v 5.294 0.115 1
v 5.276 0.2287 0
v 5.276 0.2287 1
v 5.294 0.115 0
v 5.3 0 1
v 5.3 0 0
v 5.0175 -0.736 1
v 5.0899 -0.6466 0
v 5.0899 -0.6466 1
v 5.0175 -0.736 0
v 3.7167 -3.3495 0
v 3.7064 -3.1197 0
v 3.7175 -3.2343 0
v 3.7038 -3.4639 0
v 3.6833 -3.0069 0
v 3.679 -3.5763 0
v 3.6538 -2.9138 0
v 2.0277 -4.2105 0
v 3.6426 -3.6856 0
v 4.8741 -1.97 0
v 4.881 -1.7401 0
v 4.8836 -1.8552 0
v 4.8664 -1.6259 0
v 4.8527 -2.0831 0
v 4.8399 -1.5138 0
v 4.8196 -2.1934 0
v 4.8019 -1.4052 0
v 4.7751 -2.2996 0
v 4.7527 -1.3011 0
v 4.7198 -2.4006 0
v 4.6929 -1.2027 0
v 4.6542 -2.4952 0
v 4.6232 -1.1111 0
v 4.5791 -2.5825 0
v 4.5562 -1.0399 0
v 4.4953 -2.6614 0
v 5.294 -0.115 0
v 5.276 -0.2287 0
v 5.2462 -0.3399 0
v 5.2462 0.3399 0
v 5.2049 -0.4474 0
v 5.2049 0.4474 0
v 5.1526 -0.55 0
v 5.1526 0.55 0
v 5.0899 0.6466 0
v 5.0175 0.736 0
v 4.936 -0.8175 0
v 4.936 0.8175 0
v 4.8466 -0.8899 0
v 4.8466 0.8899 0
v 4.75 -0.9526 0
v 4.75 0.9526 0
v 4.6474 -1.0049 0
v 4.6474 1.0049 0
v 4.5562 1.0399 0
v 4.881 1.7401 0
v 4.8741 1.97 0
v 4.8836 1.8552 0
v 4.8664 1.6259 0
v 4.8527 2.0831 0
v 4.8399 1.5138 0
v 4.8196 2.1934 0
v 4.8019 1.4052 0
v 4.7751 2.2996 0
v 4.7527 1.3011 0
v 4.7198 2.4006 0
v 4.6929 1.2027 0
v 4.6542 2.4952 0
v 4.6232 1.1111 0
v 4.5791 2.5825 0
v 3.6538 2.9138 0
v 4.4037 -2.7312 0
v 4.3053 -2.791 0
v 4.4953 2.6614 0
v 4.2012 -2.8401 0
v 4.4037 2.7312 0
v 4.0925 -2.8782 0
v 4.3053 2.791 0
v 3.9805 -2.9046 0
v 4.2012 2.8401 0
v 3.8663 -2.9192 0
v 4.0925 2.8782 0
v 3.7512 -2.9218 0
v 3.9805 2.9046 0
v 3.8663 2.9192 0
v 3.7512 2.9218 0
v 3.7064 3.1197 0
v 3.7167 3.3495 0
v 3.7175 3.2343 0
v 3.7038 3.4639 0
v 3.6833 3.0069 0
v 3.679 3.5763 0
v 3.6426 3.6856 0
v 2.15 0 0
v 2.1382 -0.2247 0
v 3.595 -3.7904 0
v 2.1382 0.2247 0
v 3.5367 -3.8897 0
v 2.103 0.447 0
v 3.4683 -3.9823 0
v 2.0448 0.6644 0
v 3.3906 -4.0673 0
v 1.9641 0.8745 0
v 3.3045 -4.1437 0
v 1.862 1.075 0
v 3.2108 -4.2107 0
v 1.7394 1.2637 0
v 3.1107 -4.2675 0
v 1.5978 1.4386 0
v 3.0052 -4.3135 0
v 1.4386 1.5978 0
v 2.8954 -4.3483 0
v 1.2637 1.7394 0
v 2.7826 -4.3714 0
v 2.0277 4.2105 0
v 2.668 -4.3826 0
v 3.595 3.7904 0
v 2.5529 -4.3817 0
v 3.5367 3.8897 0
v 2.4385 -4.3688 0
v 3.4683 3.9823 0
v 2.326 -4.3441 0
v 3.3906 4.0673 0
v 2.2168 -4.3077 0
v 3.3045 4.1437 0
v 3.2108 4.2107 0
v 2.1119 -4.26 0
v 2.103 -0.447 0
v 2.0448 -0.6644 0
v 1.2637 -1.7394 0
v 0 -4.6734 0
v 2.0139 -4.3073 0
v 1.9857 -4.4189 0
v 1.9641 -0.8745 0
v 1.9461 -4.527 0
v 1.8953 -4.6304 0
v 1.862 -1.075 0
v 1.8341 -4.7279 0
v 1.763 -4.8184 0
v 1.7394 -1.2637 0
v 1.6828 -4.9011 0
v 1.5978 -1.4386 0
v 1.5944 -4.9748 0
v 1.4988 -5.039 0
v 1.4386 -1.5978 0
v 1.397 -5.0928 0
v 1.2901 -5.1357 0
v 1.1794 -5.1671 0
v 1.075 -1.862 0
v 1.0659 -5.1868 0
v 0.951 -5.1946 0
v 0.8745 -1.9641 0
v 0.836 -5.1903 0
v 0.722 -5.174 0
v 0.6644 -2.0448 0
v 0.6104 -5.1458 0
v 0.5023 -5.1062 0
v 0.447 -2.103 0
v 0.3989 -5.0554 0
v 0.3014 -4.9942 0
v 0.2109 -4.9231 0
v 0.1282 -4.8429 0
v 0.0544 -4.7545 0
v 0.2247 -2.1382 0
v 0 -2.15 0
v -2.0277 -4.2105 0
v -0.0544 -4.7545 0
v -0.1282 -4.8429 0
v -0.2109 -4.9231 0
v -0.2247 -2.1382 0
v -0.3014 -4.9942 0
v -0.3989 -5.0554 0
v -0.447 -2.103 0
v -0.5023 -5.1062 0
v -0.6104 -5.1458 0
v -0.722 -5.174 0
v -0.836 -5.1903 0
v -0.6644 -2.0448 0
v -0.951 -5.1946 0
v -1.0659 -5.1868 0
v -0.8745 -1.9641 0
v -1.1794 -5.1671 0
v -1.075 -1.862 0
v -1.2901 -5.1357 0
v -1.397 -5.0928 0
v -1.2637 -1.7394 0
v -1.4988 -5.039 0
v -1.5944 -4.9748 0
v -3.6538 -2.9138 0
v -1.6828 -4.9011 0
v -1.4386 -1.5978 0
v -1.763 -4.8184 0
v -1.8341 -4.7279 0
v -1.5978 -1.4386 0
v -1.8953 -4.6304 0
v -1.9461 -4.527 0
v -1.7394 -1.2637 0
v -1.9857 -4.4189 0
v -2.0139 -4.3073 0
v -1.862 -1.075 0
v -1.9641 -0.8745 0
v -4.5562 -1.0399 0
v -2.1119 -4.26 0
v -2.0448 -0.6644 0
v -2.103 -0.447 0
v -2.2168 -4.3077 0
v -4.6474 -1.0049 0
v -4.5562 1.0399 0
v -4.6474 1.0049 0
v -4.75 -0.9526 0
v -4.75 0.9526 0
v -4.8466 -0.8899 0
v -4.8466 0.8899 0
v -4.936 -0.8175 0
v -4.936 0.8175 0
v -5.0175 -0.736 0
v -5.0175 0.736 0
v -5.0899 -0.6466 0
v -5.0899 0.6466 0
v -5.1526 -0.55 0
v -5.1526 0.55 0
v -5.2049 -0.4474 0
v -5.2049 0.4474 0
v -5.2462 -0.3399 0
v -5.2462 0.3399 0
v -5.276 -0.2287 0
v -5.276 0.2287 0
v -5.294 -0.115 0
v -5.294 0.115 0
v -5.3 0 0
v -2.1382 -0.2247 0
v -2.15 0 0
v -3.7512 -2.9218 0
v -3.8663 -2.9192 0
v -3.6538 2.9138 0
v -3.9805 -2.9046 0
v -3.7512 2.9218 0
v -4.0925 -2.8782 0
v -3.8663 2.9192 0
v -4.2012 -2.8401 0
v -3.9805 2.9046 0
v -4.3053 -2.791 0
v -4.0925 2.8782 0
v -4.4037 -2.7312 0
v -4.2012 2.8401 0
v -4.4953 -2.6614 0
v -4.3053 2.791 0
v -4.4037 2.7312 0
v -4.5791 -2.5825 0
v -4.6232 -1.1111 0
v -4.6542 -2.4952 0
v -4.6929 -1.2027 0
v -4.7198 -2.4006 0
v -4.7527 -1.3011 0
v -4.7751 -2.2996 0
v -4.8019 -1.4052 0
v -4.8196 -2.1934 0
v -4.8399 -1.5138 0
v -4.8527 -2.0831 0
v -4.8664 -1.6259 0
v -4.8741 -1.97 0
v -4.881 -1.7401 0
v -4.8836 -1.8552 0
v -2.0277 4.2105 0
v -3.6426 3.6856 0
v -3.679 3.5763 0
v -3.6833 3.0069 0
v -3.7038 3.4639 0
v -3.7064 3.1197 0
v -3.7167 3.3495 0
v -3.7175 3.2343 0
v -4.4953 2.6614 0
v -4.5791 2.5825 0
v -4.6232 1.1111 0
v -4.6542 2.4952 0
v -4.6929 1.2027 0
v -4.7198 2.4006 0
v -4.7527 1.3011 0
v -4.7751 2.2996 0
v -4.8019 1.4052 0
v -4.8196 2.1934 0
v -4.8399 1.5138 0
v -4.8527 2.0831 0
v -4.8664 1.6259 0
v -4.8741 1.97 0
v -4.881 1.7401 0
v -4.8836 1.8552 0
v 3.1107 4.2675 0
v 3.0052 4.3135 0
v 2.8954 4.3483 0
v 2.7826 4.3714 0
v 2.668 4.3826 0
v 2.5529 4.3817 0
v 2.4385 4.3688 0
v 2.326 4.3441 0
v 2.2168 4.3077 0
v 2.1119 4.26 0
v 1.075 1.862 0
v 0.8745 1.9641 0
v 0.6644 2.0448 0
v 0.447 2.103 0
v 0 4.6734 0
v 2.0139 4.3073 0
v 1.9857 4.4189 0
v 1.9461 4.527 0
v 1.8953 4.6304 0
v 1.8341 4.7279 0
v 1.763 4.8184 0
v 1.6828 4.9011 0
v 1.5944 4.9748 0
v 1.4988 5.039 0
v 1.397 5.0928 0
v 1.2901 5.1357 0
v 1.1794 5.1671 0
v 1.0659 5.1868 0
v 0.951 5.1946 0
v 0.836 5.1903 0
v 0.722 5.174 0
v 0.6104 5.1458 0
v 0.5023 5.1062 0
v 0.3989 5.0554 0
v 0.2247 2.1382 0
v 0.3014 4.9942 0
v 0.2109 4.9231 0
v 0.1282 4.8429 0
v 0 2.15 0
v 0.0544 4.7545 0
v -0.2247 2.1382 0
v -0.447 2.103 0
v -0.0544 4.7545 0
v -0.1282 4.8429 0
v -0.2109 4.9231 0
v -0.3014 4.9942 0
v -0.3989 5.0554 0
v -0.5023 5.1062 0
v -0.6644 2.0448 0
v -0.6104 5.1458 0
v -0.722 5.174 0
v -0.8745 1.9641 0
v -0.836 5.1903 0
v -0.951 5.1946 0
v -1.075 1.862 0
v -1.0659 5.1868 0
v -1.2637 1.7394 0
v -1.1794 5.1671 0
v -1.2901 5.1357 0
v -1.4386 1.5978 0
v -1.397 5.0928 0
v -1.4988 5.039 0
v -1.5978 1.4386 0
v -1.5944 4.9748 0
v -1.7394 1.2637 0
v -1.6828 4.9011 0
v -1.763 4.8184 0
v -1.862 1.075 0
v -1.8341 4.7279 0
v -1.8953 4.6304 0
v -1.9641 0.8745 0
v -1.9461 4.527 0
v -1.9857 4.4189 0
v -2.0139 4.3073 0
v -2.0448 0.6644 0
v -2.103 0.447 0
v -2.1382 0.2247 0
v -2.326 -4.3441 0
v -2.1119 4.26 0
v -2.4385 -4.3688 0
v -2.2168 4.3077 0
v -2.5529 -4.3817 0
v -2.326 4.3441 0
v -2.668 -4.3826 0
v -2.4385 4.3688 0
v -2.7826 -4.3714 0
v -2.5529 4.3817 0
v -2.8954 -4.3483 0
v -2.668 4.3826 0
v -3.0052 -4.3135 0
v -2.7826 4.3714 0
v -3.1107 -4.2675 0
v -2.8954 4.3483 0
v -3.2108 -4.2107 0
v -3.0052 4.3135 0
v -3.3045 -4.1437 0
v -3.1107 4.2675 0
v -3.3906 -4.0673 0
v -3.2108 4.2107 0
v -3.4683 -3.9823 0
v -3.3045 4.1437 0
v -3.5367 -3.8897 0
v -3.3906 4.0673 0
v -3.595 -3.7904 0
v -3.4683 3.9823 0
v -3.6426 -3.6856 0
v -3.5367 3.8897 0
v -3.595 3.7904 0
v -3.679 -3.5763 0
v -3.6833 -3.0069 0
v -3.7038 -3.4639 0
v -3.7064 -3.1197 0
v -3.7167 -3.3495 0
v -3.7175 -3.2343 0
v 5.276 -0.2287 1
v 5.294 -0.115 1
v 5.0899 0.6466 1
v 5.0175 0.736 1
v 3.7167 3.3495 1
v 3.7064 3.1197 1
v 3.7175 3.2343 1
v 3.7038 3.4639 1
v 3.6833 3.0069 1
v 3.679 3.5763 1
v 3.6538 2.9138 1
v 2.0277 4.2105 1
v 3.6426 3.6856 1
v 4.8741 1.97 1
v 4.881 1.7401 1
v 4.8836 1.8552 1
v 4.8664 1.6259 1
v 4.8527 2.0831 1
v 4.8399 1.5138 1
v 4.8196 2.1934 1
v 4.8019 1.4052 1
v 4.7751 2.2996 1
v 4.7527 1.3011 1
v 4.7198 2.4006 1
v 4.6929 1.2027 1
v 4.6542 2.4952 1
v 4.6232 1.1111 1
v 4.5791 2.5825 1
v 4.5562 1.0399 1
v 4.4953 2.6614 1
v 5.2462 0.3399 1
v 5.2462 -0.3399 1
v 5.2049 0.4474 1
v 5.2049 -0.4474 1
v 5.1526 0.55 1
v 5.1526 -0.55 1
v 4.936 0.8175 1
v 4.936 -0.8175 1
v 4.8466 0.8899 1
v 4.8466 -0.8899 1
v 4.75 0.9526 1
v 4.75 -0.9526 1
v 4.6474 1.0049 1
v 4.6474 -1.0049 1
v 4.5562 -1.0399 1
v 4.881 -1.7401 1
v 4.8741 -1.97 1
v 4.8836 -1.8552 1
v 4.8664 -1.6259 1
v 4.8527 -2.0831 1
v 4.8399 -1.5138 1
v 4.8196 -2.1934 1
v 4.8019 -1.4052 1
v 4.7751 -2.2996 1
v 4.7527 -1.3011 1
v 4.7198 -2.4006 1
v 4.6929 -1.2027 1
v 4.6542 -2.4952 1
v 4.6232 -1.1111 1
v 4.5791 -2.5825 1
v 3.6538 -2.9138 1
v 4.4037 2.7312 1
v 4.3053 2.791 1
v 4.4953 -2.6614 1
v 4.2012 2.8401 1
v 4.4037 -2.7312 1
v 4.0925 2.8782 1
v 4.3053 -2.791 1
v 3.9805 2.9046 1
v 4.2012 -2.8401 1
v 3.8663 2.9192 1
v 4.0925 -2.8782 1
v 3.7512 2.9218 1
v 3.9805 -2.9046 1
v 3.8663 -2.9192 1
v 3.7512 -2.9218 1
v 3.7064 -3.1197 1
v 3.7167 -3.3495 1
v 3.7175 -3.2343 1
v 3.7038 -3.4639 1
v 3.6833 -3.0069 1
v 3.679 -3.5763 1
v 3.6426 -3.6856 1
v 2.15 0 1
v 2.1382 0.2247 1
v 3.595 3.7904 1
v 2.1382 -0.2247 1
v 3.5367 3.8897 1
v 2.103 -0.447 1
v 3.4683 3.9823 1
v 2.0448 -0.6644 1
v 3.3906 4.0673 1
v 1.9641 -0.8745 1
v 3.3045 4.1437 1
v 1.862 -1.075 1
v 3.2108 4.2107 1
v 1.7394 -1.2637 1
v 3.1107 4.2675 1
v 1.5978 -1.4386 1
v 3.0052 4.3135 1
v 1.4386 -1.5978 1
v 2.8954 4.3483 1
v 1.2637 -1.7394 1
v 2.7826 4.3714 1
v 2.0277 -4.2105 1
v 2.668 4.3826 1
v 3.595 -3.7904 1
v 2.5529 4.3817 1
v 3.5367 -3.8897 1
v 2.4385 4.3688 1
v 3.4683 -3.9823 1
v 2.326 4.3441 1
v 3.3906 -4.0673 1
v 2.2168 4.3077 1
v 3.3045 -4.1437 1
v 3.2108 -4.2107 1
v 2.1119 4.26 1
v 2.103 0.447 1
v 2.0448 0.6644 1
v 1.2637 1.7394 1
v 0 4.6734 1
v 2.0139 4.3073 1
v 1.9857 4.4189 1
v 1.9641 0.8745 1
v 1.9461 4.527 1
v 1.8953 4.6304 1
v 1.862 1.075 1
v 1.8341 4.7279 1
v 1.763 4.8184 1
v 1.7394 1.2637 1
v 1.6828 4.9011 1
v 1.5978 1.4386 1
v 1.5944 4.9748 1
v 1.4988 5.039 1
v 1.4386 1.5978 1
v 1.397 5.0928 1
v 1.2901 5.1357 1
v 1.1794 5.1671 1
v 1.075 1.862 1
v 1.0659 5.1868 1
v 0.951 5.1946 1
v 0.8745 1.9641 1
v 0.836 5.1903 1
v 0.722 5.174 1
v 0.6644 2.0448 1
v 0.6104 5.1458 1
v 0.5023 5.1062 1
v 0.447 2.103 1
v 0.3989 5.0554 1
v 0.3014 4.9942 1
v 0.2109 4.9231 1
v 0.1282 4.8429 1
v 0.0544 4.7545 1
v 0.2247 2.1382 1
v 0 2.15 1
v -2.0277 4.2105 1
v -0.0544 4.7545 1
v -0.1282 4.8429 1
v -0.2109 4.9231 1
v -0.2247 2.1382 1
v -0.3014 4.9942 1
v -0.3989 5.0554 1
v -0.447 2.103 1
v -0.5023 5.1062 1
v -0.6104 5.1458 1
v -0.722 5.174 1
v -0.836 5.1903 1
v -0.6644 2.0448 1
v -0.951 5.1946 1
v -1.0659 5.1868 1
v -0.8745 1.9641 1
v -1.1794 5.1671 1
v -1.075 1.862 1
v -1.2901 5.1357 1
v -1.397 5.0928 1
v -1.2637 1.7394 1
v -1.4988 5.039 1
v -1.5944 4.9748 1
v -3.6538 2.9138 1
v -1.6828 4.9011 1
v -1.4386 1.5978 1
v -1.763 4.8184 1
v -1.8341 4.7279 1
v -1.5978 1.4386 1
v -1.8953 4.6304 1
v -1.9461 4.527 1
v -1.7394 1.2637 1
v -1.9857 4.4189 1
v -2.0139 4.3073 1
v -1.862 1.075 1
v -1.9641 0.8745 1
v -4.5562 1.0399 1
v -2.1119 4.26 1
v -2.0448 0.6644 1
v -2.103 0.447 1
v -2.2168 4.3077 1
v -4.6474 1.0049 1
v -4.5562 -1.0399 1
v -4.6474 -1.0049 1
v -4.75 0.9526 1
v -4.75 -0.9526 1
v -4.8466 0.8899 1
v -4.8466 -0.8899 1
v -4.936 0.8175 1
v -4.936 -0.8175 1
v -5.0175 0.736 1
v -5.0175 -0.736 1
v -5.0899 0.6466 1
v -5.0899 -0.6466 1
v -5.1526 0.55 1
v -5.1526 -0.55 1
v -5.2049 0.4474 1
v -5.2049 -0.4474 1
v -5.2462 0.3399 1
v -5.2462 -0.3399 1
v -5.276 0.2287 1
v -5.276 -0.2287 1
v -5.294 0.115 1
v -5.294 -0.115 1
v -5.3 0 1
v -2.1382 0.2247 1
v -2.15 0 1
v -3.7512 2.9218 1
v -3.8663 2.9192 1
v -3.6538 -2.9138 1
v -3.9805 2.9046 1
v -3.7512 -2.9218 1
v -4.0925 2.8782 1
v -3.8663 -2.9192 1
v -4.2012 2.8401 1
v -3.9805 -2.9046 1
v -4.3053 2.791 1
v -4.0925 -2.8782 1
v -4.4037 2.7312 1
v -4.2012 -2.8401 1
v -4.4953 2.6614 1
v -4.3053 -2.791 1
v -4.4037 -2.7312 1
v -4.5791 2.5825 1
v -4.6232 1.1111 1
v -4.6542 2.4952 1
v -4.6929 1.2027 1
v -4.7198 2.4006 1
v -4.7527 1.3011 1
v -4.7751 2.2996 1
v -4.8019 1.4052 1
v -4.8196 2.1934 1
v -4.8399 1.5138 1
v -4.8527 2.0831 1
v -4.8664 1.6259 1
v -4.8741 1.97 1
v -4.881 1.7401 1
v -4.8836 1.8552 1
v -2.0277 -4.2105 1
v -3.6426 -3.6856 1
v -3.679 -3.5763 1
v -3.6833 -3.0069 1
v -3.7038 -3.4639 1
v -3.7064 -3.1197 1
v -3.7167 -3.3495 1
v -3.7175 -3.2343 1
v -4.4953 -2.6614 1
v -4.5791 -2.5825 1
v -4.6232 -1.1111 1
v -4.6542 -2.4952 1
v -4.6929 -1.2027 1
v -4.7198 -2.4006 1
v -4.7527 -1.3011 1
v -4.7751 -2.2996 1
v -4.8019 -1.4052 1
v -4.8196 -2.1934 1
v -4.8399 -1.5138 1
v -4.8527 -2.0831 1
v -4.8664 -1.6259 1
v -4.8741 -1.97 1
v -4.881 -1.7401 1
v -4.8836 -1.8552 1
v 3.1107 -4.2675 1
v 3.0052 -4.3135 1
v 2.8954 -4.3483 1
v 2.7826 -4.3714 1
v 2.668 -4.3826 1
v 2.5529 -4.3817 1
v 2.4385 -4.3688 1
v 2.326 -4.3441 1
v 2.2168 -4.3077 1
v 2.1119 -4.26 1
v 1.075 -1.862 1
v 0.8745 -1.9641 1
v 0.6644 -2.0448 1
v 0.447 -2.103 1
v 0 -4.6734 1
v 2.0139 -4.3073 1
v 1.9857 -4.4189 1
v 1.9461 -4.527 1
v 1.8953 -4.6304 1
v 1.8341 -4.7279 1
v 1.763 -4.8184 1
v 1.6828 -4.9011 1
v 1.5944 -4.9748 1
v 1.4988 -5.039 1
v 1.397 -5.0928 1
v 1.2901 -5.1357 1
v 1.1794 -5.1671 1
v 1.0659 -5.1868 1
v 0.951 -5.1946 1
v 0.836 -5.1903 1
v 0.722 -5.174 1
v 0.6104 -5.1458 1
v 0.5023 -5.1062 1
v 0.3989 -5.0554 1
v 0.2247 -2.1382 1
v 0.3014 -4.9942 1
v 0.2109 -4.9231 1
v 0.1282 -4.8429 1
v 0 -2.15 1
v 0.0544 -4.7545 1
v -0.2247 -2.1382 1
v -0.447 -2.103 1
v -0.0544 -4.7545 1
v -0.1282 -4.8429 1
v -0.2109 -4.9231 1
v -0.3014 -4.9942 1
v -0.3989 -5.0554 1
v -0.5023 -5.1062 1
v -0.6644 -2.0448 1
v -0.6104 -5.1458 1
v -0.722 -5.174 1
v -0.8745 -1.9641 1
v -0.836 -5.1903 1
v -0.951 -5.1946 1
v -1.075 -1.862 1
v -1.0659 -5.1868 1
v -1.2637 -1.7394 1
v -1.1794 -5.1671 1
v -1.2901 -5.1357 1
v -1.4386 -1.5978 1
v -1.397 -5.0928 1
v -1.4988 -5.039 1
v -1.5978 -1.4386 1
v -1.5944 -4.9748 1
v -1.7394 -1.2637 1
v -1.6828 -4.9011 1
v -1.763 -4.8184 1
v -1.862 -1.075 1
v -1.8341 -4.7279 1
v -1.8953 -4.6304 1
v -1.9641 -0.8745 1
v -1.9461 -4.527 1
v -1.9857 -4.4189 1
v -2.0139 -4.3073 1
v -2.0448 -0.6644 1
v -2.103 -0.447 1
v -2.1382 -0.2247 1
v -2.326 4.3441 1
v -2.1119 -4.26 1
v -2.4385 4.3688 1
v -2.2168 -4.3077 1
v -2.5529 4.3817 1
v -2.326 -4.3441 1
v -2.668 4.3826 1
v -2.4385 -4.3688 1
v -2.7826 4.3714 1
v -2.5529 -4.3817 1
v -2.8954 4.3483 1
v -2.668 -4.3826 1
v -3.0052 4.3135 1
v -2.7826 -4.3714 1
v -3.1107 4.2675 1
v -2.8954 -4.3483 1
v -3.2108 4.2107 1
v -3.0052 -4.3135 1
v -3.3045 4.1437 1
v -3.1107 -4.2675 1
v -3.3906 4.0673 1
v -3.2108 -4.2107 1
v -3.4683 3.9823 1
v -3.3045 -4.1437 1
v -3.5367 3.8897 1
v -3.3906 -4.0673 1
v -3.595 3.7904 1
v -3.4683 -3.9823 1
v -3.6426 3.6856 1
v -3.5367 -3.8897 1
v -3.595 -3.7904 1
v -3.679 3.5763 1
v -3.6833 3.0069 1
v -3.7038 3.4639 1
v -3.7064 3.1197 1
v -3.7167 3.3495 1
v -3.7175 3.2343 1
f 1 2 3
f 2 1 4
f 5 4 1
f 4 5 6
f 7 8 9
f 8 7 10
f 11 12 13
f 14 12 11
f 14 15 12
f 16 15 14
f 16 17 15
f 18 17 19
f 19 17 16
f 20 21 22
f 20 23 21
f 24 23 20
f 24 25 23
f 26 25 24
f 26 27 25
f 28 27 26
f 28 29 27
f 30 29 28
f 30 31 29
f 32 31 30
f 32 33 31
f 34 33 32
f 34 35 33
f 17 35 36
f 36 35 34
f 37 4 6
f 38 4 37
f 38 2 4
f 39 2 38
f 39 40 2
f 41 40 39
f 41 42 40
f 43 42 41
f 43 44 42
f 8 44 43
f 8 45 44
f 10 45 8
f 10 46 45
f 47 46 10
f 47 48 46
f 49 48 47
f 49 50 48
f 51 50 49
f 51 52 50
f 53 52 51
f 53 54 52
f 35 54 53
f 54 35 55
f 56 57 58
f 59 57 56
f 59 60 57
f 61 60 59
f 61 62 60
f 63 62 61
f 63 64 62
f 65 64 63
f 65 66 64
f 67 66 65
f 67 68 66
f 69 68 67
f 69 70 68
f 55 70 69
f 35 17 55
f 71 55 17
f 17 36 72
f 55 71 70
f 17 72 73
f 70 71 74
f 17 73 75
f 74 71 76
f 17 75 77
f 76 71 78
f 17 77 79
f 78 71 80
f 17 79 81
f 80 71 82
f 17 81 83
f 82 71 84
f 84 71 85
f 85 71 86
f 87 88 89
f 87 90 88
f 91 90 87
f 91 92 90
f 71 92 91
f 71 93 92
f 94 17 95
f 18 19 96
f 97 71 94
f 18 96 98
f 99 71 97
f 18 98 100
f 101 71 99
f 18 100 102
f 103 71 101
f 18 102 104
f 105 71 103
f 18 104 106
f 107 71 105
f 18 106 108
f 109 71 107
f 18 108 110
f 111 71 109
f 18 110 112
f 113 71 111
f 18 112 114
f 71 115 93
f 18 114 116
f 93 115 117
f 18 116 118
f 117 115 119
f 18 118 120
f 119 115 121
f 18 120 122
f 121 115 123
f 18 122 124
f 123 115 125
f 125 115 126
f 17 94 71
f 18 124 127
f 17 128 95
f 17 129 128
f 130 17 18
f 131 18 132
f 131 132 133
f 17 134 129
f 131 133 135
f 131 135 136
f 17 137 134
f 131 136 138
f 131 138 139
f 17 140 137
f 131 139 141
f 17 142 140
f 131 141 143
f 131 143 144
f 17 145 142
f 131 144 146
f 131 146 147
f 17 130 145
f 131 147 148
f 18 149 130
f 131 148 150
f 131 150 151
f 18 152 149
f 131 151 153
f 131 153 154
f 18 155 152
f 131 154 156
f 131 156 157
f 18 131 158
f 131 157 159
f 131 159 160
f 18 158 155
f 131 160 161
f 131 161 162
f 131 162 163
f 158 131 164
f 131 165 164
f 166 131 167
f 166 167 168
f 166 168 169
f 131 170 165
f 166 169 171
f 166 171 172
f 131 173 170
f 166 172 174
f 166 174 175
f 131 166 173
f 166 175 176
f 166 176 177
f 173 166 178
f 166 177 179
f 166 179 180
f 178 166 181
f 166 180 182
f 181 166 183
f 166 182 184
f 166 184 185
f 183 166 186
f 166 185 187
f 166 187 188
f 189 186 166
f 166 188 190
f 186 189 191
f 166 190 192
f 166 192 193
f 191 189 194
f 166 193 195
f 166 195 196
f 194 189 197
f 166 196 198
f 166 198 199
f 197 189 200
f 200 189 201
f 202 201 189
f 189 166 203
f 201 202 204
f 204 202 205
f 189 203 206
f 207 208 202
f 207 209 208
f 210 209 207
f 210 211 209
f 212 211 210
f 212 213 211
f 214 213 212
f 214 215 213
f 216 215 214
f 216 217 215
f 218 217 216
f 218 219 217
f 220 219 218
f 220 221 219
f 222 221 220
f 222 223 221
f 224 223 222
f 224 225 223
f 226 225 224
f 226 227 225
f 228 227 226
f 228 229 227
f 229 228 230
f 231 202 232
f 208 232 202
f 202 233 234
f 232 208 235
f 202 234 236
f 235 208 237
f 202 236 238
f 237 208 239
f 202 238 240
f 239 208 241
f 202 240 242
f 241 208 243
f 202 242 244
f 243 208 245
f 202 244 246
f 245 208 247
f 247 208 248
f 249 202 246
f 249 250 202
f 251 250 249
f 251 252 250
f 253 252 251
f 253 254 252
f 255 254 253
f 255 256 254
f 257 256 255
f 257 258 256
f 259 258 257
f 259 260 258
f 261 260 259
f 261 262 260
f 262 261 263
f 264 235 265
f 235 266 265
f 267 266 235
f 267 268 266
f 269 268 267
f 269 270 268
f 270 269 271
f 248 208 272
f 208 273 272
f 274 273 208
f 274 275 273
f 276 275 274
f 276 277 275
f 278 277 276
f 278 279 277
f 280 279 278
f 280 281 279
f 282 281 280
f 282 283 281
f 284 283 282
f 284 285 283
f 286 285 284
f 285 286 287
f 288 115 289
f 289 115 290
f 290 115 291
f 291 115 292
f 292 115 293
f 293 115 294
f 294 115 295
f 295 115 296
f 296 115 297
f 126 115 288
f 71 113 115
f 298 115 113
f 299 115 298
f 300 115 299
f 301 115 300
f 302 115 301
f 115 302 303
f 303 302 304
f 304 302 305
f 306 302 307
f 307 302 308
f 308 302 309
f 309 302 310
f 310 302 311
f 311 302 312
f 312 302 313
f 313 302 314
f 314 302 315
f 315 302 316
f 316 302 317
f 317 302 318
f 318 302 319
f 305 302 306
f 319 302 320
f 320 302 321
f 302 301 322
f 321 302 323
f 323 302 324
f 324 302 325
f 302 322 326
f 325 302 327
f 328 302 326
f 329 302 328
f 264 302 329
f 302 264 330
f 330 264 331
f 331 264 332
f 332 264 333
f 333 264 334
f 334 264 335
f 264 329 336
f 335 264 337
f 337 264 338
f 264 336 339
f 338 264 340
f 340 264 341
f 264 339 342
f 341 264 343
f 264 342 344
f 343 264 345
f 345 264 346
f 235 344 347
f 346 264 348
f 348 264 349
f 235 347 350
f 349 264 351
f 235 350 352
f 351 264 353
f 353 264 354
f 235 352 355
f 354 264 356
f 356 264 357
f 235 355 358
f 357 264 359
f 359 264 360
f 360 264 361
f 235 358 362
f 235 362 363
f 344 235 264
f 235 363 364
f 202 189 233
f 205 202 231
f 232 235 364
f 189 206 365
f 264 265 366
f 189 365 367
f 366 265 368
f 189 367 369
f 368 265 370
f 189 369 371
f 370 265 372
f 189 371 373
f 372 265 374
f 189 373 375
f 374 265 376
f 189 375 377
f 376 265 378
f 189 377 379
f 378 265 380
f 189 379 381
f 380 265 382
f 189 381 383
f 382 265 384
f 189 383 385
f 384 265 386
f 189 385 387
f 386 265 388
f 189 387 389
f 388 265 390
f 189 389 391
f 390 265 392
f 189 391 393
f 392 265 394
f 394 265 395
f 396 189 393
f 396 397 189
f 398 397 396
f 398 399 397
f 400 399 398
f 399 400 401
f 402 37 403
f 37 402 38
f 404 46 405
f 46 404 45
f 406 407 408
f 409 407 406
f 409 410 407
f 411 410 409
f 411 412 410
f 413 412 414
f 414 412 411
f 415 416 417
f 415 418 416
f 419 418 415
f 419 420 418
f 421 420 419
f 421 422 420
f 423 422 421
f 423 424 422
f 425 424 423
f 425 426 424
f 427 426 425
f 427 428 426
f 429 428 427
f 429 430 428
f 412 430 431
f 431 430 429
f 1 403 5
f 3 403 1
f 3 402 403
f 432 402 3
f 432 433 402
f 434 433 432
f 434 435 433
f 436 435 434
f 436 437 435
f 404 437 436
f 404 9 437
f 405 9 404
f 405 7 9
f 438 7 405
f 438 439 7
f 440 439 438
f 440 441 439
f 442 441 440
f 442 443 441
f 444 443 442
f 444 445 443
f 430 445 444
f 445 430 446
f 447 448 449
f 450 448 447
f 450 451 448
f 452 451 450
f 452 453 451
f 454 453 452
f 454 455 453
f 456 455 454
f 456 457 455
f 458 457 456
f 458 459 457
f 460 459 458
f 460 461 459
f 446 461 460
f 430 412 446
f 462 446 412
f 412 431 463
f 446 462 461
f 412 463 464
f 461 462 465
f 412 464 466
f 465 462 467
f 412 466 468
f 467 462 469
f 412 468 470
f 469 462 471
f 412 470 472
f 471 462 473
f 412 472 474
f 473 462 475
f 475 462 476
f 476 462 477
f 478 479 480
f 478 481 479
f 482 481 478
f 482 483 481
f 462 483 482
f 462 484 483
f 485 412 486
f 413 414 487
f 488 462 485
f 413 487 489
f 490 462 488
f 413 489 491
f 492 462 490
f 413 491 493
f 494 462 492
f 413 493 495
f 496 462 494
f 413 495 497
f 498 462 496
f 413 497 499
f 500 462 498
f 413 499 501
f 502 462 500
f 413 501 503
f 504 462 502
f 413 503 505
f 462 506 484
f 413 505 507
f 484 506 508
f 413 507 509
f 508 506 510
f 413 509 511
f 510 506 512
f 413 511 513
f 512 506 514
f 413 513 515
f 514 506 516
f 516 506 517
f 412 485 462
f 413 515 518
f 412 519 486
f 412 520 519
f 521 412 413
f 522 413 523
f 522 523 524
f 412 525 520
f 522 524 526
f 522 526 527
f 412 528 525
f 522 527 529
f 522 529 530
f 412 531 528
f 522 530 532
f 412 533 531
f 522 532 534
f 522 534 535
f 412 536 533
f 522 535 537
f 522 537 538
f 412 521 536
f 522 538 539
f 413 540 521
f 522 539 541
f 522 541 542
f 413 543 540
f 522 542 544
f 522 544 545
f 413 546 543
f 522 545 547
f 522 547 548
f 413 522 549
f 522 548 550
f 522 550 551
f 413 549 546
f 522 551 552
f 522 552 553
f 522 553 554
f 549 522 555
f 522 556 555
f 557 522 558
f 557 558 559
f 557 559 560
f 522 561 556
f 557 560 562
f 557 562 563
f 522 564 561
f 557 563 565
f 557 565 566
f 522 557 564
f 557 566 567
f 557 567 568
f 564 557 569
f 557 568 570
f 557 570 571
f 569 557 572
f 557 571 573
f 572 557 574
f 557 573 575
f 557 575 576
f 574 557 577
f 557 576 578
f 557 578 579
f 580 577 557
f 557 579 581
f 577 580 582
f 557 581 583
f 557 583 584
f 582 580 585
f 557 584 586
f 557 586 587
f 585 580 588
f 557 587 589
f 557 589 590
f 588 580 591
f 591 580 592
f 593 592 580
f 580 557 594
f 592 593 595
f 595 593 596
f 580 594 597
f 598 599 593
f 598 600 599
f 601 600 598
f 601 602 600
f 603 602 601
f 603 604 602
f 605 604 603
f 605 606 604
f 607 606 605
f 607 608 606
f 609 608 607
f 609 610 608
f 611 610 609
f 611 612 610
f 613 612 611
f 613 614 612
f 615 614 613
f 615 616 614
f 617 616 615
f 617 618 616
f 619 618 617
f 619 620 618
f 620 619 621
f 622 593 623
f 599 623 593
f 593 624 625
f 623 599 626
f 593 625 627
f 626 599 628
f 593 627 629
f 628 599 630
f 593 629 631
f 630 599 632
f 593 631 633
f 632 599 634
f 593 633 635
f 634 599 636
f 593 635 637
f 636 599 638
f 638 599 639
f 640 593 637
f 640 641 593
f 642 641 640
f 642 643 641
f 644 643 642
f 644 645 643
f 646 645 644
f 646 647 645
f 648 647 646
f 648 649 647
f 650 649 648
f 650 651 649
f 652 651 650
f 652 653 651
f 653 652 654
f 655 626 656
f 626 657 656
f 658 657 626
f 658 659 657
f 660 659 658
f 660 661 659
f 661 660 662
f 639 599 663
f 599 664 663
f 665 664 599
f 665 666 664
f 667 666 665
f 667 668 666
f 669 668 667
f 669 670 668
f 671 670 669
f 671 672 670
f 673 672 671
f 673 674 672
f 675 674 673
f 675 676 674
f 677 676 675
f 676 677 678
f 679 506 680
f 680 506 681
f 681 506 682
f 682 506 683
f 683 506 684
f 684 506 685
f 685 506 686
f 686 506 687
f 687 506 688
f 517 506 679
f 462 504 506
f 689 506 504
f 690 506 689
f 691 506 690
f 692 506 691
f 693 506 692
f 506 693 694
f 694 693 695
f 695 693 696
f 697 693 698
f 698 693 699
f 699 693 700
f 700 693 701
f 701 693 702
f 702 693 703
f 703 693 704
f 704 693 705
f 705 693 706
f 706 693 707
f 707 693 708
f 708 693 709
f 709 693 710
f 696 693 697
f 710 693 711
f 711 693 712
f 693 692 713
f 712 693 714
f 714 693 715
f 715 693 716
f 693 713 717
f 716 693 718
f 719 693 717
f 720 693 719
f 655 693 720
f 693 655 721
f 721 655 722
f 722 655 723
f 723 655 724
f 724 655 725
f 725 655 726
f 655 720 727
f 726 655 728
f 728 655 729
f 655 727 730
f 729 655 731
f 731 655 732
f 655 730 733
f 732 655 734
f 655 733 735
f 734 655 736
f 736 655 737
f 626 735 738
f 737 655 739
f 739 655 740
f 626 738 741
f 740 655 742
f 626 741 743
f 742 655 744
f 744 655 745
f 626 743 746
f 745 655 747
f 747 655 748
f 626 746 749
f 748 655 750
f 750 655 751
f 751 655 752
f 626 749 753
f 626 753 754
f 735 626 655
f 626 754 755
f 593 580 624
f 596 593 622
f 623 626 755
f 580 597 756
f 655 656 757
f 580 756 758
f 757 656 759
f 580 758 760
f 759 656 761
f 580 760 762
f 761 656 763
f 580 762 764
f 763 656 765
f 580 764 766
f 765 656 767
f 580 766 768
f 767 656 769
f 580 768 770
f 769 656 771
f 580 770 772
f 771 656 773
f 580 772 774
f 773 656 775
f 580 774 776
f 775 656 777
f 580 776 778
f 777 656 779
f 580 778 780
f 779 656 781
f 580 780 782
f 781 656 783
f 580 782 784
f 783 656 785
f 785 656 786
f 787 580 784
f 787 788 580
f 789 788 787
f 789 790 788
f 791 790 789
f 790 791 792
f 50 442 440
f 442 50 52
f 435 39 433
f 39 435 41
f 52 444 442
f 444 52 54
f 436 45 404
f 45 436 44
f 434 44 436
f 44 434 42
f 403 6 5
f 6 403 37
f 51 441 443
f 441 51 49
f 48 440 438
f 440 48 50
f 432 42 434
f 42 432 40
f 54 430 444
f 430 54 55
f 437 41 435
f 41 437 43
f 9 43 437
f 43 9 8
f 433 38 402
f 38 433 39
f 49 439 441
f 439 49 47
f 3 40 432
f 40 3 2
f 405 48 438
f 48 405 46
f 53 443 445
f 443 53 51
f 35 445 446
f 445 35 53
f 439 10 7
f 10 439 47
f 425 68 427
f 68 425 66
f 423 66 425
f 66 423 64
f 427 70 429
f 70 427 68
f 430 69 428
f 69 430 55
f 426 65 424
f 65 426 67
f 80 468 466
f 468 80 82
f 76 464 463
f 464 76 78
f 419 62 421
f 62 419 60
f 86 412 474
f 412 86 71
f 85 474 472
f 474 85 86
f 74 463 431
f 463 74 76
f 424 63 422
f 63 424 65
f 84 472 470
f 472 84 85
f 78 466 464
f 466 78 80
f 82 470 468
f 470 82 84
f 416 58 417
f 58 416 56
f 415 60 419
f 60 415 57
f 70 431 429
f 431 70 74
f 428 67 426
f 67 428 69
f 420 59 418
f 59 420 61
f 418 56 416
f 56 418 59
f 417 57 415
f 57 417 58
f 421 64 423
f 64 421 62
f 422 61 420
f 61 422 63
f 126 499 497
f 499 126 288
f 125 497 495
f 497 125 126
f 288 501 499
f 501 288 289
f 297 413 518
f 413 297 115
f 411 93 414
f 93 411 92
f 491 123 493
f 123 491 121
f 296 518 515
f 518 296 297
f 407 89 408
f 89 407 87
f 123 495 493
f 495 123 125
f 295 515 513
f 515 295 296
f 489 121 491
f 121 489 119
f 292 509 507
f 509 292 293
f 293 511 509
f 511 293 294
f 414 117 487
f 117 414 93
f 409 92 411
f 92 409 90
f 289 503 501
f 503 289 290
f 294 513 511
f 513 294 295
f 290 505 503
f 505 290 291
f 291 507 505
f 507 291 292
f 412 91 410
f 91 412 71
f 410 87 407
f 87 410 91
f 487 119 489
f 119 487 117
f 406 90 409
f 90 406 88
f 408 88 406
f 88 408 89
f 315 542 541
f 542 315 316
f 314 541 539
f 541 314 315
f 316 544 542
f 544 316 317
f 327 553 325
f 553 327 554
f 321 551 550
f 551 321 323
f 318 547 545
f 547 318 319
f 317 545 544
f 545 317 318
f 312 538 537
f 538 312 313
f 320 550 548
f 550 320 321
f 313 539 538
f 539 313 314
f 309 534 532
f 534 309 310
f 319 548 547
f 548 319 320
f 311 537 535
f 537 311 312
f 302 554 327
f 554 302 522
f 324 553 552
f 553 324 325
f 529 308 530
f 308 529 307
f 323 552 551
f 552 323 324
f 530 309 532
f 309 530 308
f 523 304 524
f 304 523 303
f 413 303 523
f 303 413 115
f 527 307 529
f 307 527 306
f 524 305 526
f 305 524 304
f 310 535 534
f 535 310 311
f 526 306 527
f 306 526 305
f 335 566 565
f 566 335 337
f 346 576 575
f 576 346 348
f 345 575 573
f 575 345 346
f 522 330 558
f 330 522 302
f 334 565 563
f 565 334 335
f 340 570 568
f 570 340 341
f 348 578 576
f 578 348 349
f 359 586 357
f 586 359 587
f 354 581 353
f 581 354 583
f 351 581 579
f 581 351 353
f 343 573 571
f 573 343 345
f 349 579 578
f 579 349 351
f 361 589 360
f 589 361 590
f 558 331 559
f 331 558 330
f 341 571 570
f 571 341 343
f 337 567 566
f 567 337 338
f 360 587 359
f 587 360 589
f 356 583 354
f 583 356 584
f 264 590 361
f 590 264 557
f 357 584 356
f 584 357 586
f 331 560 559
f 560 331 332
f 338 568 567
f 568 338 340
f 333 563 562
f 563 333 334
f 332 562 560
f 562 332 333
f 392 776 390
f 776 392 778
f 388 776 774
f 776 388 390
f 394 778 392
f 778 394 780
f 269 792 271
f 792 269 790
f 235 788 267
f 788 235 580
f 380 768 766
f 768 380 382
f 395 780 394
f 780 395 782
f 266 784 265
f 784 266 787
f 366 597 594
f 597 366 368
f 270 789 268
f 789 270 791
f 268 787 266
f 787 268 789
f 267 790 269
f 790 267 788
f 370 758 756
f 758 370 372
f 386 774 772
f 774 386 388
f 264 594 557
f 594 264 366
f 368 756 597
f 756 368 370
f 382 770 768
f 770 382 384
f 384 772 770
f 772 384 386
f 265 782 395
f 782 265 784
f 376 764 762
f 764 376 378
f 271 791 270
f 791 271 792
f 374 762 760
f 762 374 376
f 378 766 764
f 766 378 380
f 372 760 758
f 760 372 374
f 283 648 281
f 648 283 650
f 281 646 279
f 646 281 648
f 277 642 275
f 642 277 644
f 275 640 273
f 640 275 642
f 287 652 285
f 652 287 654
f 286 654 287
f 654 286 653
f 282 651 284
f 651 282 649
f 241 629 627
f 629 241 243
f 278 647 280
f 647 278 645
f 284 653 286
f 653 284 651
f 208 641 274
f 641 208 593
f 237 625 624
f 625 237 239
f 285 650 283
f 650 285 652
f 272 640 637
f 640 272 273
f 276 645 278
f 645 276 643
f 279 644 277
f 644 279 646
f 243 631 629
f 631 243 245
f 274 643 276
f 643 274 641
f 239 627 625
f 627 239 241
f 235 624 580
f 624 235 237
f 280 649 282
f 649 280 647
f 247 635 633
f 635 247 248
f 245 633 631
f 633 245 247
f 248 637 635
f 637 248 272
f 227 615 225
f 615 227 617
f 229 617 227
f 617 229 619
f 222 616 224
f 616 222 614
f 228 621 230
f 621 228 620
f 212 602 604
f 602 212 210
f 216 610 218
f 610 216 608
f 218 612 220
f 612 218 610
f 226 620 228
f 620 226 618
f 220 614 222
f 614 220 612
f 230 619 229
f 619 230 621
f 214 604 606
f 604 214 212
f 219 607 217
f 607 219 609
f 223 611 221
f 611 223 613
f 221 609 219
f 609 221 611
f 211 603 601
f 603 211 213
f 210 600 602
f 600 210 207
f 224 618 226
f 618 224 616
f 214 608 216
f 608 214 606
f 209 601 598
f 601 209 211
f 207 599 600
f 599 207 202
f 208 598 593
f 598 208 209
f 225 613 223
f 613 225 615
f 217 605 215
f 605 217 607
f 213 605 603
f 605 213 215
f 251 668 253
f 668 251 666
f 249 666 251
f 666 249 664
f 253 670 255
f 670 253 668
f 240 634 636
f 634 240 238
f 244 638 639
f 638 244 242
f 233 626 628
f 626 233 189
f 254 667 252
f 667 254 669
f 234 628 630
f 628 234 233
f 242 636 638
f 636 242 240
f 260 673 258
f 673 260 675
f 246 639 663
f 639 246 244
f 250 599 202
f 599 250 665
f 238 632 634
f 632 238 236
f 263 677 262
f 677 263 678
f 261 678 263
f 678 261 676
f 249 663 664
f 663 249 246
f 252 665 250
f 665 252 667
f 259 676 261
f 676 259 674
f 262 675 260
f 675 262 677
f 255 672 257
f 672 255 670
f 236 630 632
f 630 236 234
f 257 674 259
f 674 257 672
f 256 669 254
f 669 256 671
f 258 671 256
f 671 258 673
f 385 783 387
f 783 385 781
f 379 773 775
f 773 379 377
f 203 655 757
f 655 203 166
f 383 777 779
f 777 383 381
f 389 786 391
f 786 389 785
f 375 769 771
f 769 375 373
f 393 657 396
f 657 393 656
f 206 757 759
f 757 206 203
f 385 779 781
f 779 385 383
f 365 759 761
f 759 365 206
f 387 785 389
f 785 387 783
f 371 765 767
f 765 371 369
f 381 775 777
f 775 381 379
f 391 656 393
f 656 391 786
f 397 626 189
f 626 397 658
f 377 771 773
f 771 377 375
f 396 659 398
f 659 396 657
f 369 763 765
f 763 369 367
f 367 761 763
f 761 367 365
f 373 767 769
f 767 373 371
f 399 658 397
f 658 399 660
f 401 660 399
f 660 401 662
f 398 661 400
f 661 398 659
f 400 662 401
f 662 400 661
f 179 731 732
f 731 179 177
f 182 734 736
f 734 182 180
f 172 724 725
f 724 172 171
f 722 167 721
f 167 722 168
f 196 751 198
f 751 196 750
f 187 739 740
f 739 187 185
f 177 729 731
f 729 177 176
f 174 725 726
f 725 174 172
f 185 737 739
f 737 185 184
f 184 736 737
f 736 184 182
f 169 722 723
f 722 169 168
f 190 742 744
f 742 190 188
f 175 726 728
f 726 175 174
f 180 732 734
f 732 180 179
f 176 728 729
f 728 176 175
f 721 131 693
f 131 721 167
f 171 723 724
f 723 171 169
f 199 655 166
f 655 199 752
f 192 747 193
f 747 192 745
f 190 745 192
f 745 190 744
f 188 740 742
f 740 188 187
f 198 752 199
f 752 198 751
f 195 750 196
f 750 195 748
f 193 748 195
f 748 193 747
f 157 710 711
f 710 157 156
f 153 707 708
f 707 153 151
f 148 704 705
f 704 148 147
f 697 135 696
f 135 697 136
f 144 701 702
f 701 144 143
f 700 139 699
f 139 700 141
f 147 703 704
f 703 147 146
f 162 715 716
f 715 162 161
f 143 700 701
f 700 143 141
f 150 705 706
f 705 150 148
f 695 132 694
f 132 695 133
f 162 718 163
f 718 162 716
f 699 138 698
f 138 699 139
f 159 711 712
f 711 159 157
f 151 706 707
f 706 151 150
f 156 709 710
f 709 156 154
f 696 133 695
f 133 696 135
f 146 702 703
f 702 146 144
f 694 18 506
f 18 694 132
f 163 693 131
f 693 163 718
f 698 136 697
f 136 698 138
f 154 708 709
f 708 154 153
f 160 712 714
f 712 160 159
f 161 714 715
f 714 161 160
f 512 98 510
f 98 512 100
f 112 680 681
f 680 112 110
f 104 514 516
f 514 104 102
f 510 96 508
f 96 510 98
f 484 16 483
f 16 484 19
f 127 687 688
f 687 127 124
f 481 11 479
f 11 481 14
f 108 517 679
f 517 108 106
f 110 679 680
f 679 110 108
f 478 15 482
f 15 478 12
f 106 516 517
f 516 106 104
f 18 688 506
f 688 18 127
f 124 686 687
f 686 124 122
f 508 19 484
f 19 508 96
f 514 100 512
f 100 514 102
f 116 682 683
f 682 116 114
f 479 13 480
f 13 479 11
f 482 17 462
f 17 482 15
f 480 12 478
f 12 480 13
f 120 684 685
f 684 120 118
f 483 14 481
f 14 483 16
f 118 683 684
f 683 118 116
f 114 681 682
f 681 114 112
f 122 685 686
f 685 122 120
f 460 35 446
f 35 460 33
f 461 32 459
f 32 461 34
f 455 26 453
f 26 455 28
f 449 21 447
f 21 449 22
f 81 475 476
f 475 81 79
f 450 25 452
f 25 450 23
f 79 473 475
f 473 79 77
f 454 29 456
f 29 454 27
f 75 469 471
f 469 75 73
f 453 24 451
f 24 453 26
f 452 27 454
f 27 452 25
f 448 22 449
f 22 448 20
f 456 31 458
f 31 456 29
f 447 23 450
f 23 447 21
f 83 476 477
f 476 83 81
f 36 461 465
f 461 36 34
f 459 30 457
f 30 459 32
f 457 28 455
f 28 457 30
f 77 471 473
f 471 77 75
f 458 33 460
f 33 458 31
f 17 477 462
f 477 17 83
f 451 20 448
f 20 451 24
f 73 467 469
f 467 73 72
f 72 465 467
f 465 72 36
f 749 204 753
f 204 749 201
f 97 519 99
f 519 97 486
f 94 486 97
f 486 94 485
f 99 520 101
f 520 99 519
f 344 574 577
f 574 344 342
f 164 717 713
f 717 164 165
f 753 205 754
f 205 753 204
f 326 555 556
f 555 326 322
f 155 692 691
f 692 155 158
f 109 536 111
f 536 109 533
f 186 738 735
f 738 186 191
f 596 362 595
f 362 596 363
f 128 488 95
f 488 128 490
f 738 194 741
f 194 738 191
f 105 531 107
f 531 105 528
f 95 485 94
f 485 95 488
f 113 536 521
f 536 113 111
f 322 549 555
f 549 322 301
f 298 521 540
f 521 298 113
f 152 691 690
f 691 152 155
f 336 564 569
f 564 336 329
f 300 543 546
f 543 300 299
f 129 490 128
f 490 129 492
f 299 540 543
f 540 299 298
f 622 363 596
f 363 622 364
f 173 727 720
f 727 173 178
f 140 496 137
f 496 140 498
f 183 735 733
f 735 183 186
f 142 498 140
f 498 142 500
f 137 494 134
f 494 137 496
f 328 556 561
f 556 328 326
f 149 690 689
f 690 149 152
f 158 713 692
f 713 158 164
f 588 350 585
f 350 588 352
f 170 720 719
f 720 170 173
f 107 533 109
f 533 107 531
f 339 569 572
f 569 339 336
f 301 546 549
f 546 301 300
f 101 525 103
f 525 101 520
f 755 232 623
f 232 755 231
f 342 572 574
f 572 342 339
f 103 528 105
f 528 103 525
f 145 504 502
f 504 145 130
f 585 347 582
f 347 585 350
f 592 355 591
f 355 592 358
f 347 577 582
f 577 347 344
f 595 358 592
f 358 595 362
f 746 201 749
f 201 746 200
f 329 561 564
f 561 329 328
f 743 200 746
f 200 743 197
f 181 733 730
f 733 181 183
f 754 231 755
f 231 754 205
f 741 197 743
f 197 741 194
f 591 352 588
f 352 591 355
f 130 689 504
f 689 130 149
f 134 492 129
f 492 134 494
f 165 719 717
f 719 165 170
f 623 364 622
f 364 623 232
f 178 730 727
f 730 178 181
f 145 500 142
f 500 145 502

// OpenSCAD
// External-serrated lock washer.
$fn = 60;
eps = 0.02;
inner_d = 4.3;
outer_d = 10;
thickness = 1;
teeth = 14;
difference() {
    union() {
        cylinder(d=outer_d-1.2,h=thickness);
        for(i=[0:teeth-1]) rotate([0,0,i*360/teeth]) translate([outer_d/2-0.8,0,0]) cylinder(d=2.2,h=thickness);
    }
    translate([0,0,-eps]) cylinder(d=inner_d,h=thickness+2*eps);
}
